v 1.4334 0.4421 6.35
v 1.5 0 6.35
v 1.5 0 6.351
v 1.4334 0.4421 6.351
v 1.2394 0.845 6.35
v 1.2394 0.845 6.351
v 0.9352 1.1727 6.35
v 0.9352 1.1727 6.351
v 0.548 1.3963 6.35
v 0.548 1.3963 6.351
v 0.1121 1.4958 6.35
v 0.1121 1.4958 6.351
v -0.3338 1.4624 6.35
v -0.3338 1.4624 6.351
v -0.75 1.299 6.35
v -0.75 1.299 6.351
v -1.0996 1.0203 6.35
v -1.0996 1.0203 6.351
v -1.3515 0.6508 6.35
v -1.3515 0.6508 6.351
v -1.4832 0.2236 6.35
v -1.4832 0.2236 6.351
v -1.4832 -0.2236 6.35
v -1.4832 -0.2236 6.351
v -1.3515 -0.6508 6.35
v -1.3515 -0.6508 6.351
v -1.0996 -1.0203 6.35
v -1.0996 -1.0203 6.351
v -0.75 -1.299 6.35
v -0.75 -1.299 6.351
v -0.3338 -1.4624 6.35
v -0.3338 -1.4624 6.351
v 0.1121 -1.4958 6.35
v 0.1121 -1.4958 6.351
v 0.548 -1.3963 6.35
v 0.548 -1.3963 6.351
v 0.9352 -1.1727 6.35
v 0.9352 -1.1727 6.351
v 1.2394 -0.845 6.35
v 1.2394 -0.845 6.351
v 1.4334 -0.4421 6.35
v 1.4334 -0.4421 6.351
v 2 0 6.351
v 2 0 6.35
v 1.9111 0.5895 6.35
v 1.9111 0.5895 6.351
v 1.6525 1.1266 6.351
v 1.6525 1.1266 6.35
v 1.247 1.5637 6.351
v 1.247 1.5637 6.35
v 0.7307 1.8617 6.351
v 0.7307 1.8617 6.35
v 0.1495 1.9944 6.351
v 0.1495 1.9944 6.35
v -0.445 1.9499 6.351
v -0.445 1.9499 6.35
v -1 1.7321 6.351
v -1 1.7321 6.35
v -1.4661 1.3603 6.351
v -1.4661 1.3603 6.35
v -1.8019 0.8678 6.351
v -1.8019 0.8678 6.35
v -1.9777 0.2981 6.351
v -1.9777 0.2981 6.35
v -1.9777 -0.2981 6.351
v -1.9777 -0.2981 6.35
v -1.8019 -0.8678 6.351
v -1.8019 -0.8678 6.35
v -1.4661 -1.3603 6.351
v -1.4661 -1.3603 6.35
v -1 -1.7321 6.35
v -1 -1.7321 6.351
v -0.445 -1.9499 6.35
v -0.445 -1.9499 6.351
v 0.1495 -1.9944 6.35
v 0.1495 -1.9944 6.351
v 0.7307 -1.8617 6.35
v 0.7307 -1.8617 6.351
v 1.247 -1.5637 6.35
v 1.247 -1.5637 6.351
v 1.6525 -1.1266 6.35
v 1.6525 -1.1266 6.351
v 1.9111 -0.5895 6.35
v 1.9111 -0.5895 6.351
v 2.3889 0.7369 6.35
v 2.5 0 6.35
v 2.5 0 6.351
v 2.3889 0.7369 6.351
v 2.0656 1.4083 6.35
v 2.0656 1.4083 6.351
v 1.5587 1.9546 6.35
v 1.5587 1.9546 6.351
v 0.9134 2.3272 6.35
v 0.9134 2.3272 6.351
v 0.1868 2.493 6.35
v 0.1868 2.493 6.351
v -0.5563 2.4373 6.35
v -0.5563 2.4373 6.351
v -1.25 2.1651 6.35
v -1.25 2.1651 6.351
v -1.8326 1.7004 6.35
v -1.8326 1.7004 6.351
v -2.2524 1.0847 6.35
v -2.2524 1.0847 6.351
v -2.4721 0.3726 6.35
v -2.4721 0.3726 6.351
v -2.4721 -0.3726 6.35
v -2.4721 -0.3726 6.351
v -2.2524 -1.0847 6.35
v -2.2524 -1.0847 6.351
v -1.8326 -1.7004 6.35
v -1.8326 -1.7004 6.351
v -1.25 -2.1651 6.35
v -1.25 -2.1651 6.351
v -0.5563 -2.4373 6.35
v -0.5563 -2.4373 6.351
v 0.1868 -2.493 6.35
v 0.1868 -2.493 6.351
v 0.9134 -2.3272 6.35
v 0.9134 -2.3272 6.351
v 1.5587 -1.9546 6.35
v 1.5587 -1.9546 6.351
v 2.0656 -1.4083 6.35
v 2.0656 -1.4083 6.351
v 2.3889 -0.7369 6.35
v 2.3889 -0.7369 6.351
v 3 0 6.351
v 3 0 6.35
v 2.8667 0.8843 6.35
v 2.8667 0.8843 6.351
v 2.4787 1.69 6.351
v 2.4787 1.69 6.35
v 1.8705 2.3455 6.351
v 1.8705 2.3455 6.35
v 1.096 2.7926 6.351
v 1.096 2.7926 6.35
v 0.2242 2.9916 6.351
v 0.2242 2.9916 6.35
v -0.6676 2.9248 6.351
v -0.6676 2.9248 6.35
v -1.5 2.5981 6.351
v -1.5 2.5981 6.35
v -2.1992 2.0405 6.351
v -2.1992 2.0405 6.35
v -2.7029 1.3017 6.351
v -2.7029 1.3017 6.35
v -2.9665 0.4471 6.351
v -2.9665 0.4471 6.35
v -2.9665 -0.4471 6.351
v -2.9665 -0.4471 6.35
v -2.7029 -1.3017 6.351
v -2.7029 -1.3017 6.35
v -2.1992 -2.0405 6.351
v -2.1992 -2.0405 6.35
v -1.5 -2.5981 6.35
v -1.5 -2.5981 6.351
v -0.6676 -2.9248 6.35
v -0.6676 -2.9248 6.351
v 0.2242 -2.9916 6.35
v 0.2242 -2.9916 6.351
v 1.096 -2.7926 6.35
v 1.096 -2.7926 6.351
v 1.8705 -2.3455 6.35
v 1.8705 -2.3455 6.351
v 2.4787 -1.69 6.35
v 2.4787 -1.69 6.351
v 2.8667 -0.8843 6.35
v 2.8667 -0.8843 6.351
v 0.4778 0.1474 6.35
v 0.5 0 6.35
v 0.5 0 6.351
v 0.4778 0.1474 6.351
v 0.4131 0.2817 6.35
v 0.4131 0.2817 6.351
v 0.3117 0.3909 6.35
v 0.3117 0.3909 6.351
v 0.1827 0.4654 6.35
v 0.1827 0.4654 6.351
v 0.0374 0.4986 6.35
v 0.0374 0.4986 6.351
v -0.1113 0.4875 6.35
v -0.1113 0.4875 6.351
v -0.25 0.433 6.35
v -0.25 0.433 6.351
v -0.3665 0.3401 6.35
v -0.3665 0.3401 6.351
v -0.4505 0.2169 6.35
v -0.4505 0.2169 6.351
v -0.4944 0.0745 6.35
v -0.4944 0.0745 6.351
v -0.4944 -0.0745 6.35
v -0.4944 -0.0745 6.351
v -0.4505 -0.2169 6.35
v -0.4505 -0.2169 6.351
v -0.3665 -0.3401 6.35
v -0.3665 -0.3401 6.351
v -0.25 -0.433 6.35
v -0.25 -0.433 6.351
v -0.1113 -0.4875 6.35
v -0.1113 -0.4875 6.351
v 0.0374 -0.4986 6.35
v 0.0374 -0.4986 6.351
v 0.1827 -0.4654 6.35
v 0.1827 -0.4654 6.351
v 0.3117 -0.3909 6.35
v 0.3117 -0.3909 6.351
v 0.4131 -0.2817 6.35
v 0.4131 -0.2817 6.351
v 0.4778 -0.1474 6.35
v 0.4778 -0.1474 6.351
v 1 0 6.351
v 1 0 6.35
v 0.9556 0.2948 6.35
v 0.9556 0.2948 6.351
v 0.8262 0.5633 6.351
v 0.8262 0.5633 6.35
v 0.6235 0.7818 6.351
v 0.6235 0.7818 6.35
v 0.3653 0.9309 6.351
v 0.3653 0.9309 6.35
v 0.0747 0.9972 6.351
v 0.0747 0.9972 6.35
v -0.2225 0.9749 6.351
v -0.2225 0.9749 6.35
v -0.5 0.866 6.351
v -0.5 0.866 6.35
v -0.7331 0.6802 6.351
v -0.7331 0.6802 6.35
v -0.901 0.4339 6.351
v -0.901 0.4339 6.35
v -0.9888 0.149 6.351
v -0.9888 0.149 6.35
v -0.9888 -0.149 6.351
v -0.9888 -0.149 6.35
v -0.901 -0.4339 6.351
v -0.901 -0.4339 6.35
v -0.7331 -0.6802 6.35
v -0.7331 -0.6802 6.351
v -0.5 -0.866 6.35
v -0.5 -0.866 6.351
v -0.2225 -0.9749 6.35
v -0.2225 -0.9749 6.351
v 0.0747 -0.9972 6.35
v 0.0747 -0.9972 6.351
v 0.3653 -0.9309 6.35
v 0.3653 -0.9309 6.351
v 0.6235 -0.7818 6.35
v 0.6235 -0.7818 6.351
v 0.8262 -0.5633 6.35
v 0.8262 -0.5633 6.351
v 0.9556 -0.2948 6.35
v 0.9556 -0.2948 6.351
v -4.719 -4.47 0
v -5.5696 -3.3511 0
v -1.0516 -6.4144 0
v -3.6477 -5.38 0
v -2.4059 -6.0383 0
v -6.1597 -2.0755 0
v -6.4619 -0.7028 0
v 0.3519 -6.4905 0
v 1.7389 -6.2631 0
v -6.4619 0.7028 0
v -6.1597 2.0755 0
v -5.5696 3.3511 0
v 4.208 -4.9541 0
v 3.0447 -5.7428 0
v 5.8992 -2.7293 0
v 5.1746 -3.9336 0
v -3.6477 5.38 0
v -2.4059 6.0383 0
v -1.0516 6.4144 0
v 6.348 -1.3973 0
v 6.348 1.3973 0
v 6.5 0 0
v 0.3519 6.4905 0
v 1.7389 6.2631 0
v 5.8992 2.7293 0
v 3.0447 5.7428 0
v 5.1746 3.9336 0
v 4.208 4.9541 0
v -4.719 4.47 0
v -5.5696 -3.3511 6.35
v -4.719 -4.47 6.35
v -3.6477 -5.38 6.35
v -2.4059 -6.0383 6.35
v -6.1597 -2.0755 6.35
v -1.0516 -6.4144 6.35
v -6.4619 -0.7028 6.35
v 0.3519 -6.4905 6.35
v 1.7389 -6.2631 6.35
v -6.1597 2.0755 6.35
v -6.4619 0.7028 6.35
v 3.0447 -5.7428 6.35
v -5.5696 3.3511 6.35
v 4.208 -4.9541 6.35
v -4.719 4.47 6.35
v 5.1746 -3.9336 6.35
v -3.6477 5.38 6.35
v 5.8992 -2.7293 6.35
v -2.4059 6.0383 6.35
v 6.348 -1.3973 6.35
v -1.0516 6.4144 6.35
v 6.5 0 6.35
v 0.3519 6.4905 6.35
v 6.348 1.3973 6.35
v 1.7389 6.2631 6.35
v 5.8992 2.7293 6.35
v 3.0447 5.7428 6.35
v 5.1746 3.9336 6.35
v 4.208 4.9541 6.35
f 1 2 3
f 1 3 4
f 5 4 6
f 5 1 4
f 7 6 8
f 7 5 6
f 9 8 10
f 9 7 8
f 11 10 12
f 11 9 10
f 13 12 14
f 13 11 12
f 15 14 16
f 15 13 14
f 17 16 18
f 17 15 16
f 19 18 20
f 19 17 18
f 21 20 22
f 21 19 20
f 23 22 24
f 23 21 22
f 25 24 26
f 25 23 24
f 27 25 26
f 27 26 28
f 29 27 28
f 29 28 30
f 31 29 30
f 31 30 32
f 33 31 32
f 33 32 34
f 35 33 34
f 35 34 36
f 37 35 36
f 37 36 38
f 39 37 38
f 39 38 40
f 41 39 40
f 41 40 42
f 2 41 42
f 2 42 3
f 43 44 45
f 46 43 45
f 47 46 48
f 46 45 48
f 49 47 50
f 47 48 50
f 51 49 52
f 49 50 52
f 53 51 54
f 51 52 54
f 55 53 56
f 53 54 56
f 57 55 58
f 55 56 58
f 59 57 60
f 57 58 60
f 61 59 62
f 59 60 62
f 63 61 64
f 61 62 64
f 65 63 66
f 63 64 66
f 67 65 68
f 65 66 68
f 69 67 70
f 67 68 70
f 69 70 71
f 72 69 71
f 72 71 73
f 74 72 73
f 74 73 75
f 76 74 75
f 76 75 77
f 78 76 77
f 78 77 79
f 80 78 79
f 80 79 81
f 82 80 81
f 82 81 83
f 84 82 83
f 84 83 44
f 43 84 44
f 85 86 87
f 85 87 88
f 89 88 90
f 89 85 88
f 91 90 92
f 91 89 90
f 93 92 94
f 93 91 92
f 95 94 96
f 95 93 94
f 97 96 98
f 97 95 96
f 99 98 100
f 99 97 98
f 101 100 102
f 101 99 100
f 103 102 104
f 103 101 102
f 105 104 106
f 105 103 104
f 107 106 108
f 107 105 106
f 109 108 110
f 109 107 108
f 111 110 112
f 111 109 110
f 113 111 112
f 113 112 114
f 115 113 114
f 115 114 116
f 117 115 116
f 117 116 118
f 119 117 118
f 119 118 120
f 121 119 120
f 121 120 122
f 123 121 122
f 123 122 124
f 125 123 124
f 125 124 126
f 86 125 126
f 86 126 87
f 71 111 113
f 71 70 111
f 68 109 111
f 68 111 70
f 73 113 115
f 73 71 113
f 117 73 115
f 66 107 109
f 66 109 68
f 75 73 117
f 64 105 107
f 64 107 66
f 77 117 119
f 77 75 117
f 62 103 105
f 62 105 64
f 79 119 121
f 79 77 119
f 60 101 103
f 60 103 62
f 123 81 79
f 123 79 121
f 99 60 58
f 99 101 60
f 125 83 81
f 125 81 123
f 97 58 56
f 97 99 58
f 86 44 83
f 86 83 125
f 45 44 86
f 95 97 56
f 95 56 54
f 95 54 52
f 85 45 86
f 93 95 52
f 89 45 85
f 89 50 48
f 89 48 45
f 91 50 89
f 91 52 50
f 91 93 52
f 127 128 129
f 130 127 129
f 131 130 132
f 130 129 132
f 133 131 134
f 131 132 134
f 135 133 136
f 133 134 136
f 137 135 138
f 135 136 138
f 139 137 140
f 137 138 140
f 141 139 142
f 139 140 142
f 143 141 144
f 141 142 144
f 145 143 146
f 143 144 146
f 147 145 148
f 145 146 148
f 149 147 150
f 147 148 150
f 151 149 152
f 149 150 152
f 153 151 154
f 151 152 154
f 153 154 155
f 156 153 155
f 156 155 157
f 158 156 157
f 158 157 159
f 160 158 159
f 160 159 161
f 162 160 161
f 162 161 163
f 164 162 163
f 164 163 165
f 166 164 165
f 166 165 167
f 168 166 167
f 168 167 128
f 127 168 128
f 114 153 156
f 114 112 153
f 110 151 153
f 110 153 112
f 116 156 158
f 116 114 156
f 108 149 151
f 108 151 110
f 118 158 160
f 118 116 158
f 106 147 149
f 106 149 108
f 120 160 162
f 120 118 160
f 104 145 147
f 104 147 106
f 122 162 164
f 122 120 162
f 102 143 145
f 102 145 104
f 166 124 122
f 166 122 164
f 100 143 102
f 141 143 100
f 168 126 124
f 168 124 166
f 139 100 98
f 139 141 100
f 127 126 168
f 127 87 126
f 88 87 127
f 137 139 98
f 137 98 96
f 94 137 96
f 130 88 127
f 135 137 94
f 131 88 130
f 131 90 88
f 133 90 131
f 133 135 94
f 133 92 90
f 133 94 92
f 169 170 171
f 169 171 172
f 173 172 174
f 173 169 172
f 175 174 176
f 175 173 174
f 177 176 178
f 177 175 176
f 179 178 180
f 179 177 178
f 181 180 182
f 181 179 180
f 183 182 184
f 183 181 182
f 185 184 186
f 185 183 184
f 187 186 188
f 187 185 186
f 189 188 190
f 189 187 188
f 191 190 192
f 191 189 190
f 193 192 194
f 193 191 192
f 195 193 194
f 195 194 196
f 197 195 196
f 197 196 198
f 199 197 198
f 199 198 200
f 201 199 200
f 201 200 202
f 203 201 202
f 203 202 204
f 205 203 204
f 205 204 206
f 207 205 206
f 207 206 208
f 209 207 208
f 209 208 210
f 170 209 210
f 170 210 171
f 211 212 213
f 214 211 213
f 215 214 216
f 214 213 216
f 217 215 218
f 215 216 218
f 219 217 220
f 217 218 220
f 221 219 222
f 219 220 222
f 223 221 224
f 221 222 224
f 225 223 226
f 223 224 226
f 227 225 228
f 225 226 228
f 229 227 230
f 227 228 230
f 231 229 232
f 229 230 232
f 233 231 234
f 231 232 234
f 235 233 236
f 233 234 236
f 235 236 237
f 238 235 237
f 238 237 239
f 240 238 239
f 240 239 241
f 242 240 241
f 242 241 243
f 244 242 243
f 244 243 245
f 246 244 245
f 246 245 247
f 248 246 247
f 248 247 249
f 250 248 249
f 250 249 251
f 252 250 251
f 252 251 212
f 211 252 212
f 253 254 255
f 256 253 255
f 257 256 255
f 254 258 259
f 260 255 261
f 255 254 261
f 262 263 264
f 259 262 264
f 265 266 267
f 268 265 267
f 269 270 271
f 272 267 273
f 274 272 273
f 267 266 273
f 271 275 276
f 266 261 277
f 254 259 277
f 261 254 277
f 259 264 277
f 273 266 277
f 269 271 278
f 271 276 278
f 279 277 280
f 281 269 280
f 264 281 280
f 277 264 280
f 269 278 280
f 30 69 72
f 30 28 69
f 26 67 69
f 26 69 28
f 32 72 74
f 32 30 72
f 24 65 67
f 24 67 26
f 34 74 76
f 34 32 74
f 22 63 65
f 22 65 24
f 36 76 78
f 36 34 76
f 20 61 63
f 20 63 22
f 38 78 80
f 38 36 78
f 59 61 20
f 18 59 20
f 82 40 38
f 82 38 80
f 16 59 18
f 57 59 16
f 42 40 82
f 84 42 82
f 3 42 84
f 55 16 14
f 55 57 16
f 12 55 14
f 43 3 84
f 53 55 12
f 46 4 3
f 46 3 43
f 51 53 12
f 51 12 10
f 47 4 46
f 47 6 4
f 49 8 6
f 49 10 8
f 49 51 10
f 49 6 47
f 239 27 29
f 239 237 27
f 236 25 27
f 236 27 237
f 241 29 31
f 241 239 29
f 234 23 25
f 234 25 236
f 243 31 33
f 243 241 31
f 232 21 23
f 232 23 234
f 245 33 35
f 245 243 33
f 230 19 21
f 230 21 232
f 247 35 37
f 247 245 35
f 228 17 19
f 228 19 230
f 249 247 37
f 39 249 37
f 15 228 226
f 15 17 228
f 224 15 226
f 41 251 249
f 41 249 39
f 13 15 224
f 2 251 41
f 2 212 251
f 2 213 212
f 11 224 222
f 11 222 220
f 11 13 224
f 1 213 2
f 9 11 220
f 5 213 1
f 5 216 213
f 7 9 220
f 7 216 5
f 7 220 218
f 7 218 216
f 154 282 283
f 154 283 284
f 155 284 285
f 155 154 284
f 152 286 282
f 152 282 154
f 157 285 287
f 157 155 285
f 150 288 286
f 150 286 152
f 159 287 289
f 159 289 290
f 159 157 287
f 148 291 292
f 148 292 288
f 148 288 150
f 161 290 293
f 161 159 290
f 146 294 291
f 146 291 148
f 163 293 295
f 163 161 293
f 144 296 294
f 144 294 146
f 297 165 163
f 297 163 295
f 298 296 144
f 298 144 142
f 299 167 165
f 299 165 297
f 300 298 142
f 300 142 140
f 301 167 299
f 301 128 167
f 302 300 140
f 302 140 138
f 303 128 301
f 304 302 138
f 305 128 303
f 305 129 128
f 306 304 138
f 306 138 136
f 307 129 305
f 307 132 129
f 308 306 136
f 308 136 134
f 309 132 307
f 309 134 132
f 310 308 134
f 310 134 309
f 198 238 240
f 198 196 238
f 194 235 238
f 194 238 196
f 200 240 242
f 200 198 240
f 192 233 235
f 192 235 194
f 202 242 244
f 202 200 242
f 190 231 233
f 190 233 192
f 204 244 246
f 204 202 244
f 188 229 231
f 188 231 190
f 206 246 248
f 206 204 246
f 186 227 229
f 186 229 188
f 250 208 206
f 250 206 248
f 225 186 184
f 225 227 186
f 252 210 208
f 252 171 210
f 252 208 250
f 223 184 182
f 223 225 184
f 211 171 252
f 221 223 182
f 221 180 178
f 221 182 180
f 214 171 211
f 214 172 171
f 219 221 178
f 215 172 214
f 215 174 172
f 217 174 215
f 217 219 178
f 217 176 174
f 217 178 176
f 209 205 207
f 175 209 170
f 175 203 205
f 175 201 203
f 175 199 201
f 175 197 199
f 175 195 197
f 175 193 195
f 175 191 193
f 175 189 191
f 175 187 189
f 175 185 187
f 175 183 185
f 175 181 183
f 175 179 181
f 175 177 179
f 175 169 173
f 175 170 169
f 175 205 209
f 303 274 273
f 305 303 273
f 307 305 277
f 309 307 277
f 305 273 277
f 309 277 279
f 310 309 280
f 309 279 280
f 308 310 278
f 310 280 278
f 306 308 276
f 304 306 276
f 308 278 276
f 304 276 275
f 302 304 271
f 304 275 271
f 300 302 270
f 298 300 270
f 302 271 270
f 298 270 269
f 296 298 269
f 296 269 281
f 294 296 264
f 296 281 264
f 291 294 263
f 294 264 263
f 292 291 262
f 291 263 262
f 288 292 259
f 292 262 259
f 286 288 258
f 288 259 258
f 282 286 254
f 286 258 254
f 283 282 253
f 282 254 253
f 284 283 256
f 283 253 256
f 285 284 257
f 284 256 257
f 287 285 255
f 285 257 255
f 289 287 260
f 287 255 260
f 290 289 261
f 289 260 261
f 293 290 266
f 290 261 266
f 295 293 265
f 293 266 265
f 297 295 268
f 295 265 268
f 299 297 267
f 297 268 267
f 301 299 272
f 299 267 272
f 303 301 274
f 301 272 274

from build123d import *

# Parameters (mm, degrees)
SKETCH2_R      = 0.5
F_0TO0_5_DEPTH = 6.349
SKETCH3_R      = 1
SKETCH3_R_2    = 0.5
F_0_5TO1_DEPTH = 6.351
SKETCH4_R      = 1.5
SKETCH4_R_2    = 1
F_1TO1_5_DEPTH = 6.349
SKETCH5_R      = 2
SKETCH5_R_2    = 1.5
F_1_5TO2_DEPTH = 6.351
SKETCH6_R      = 2.5
SKETCH6_R_2    = 2
F_2TO2_5_DEPTH = 6.349
SKETCH7_R      = 3
SKETCH7_R_2    = 2.5
F_2_5TO3_DEPTH = 6.351
SKETCH8_R      = 6.5
MIRROR_2_DEPTH = 6.35


with BuildPart() as part:
    # Sketch2 → 0to0.5 (new body)
    with BuildSketch(Plane.XY):
        Circle(SKETCH2_R)
    extrude(amount=F_0TO0_5_DEPTH)

    # Sketch3 → 0.5to1 (add)
    with BuildSketch(Plane.XY):
        Circle(SKETCH3_R)
        Circle(SKETCH3_R_2, mode=Mode.SUBTRACT)
    extrude(amount=F_0_5TO1_DEPTH)

    # Sketch4 → 1to1.5 (add)
    with BuildSketch(Plane.XY):
        Circle(SKETCH4_R)
        Circle(SKETCH4_R_2, mode=Mode.SUBTRACT)
    extrude(amount=F_1TO1_5_DEPTH)

    # Sketch5 → 1.5to2 (add)
    with BuildSketch(Plane.XY):
        Circle(SKETCH5_R)
        Circle(SKETCH5_R_2, mode=Mode.SUBTRACT)
    extrude(amount=F_1_5TO2_DEPTH)

    # Sketch6 → 2to2.5 (add)
    with BuildSketch(Plane.XY):
        Circle(SKETCH6_R)
        Circle(SKETCH6_R_2, mode=Mode.SUBTRACT)
    extrude(amount=F_2TO2_5_DEPTH)

    # Sketch7 → 2.5to3 (add)
    with BuildSketch(Plane.XY):
        Circle(SKETCH7_R)
        Circle(SKETCH7_R_2, mode=Mode.SUBTRACT)
    extrude(amount=F_2_5TO3_DEPTH)

    # Sketch8 → Mirror 2 (add)
    with BuildSketch(Plane.XY):
        Circle(SKETCH8_R)
    extrude(amount=MIRROR_2_DEPTH)


solid = part.part
